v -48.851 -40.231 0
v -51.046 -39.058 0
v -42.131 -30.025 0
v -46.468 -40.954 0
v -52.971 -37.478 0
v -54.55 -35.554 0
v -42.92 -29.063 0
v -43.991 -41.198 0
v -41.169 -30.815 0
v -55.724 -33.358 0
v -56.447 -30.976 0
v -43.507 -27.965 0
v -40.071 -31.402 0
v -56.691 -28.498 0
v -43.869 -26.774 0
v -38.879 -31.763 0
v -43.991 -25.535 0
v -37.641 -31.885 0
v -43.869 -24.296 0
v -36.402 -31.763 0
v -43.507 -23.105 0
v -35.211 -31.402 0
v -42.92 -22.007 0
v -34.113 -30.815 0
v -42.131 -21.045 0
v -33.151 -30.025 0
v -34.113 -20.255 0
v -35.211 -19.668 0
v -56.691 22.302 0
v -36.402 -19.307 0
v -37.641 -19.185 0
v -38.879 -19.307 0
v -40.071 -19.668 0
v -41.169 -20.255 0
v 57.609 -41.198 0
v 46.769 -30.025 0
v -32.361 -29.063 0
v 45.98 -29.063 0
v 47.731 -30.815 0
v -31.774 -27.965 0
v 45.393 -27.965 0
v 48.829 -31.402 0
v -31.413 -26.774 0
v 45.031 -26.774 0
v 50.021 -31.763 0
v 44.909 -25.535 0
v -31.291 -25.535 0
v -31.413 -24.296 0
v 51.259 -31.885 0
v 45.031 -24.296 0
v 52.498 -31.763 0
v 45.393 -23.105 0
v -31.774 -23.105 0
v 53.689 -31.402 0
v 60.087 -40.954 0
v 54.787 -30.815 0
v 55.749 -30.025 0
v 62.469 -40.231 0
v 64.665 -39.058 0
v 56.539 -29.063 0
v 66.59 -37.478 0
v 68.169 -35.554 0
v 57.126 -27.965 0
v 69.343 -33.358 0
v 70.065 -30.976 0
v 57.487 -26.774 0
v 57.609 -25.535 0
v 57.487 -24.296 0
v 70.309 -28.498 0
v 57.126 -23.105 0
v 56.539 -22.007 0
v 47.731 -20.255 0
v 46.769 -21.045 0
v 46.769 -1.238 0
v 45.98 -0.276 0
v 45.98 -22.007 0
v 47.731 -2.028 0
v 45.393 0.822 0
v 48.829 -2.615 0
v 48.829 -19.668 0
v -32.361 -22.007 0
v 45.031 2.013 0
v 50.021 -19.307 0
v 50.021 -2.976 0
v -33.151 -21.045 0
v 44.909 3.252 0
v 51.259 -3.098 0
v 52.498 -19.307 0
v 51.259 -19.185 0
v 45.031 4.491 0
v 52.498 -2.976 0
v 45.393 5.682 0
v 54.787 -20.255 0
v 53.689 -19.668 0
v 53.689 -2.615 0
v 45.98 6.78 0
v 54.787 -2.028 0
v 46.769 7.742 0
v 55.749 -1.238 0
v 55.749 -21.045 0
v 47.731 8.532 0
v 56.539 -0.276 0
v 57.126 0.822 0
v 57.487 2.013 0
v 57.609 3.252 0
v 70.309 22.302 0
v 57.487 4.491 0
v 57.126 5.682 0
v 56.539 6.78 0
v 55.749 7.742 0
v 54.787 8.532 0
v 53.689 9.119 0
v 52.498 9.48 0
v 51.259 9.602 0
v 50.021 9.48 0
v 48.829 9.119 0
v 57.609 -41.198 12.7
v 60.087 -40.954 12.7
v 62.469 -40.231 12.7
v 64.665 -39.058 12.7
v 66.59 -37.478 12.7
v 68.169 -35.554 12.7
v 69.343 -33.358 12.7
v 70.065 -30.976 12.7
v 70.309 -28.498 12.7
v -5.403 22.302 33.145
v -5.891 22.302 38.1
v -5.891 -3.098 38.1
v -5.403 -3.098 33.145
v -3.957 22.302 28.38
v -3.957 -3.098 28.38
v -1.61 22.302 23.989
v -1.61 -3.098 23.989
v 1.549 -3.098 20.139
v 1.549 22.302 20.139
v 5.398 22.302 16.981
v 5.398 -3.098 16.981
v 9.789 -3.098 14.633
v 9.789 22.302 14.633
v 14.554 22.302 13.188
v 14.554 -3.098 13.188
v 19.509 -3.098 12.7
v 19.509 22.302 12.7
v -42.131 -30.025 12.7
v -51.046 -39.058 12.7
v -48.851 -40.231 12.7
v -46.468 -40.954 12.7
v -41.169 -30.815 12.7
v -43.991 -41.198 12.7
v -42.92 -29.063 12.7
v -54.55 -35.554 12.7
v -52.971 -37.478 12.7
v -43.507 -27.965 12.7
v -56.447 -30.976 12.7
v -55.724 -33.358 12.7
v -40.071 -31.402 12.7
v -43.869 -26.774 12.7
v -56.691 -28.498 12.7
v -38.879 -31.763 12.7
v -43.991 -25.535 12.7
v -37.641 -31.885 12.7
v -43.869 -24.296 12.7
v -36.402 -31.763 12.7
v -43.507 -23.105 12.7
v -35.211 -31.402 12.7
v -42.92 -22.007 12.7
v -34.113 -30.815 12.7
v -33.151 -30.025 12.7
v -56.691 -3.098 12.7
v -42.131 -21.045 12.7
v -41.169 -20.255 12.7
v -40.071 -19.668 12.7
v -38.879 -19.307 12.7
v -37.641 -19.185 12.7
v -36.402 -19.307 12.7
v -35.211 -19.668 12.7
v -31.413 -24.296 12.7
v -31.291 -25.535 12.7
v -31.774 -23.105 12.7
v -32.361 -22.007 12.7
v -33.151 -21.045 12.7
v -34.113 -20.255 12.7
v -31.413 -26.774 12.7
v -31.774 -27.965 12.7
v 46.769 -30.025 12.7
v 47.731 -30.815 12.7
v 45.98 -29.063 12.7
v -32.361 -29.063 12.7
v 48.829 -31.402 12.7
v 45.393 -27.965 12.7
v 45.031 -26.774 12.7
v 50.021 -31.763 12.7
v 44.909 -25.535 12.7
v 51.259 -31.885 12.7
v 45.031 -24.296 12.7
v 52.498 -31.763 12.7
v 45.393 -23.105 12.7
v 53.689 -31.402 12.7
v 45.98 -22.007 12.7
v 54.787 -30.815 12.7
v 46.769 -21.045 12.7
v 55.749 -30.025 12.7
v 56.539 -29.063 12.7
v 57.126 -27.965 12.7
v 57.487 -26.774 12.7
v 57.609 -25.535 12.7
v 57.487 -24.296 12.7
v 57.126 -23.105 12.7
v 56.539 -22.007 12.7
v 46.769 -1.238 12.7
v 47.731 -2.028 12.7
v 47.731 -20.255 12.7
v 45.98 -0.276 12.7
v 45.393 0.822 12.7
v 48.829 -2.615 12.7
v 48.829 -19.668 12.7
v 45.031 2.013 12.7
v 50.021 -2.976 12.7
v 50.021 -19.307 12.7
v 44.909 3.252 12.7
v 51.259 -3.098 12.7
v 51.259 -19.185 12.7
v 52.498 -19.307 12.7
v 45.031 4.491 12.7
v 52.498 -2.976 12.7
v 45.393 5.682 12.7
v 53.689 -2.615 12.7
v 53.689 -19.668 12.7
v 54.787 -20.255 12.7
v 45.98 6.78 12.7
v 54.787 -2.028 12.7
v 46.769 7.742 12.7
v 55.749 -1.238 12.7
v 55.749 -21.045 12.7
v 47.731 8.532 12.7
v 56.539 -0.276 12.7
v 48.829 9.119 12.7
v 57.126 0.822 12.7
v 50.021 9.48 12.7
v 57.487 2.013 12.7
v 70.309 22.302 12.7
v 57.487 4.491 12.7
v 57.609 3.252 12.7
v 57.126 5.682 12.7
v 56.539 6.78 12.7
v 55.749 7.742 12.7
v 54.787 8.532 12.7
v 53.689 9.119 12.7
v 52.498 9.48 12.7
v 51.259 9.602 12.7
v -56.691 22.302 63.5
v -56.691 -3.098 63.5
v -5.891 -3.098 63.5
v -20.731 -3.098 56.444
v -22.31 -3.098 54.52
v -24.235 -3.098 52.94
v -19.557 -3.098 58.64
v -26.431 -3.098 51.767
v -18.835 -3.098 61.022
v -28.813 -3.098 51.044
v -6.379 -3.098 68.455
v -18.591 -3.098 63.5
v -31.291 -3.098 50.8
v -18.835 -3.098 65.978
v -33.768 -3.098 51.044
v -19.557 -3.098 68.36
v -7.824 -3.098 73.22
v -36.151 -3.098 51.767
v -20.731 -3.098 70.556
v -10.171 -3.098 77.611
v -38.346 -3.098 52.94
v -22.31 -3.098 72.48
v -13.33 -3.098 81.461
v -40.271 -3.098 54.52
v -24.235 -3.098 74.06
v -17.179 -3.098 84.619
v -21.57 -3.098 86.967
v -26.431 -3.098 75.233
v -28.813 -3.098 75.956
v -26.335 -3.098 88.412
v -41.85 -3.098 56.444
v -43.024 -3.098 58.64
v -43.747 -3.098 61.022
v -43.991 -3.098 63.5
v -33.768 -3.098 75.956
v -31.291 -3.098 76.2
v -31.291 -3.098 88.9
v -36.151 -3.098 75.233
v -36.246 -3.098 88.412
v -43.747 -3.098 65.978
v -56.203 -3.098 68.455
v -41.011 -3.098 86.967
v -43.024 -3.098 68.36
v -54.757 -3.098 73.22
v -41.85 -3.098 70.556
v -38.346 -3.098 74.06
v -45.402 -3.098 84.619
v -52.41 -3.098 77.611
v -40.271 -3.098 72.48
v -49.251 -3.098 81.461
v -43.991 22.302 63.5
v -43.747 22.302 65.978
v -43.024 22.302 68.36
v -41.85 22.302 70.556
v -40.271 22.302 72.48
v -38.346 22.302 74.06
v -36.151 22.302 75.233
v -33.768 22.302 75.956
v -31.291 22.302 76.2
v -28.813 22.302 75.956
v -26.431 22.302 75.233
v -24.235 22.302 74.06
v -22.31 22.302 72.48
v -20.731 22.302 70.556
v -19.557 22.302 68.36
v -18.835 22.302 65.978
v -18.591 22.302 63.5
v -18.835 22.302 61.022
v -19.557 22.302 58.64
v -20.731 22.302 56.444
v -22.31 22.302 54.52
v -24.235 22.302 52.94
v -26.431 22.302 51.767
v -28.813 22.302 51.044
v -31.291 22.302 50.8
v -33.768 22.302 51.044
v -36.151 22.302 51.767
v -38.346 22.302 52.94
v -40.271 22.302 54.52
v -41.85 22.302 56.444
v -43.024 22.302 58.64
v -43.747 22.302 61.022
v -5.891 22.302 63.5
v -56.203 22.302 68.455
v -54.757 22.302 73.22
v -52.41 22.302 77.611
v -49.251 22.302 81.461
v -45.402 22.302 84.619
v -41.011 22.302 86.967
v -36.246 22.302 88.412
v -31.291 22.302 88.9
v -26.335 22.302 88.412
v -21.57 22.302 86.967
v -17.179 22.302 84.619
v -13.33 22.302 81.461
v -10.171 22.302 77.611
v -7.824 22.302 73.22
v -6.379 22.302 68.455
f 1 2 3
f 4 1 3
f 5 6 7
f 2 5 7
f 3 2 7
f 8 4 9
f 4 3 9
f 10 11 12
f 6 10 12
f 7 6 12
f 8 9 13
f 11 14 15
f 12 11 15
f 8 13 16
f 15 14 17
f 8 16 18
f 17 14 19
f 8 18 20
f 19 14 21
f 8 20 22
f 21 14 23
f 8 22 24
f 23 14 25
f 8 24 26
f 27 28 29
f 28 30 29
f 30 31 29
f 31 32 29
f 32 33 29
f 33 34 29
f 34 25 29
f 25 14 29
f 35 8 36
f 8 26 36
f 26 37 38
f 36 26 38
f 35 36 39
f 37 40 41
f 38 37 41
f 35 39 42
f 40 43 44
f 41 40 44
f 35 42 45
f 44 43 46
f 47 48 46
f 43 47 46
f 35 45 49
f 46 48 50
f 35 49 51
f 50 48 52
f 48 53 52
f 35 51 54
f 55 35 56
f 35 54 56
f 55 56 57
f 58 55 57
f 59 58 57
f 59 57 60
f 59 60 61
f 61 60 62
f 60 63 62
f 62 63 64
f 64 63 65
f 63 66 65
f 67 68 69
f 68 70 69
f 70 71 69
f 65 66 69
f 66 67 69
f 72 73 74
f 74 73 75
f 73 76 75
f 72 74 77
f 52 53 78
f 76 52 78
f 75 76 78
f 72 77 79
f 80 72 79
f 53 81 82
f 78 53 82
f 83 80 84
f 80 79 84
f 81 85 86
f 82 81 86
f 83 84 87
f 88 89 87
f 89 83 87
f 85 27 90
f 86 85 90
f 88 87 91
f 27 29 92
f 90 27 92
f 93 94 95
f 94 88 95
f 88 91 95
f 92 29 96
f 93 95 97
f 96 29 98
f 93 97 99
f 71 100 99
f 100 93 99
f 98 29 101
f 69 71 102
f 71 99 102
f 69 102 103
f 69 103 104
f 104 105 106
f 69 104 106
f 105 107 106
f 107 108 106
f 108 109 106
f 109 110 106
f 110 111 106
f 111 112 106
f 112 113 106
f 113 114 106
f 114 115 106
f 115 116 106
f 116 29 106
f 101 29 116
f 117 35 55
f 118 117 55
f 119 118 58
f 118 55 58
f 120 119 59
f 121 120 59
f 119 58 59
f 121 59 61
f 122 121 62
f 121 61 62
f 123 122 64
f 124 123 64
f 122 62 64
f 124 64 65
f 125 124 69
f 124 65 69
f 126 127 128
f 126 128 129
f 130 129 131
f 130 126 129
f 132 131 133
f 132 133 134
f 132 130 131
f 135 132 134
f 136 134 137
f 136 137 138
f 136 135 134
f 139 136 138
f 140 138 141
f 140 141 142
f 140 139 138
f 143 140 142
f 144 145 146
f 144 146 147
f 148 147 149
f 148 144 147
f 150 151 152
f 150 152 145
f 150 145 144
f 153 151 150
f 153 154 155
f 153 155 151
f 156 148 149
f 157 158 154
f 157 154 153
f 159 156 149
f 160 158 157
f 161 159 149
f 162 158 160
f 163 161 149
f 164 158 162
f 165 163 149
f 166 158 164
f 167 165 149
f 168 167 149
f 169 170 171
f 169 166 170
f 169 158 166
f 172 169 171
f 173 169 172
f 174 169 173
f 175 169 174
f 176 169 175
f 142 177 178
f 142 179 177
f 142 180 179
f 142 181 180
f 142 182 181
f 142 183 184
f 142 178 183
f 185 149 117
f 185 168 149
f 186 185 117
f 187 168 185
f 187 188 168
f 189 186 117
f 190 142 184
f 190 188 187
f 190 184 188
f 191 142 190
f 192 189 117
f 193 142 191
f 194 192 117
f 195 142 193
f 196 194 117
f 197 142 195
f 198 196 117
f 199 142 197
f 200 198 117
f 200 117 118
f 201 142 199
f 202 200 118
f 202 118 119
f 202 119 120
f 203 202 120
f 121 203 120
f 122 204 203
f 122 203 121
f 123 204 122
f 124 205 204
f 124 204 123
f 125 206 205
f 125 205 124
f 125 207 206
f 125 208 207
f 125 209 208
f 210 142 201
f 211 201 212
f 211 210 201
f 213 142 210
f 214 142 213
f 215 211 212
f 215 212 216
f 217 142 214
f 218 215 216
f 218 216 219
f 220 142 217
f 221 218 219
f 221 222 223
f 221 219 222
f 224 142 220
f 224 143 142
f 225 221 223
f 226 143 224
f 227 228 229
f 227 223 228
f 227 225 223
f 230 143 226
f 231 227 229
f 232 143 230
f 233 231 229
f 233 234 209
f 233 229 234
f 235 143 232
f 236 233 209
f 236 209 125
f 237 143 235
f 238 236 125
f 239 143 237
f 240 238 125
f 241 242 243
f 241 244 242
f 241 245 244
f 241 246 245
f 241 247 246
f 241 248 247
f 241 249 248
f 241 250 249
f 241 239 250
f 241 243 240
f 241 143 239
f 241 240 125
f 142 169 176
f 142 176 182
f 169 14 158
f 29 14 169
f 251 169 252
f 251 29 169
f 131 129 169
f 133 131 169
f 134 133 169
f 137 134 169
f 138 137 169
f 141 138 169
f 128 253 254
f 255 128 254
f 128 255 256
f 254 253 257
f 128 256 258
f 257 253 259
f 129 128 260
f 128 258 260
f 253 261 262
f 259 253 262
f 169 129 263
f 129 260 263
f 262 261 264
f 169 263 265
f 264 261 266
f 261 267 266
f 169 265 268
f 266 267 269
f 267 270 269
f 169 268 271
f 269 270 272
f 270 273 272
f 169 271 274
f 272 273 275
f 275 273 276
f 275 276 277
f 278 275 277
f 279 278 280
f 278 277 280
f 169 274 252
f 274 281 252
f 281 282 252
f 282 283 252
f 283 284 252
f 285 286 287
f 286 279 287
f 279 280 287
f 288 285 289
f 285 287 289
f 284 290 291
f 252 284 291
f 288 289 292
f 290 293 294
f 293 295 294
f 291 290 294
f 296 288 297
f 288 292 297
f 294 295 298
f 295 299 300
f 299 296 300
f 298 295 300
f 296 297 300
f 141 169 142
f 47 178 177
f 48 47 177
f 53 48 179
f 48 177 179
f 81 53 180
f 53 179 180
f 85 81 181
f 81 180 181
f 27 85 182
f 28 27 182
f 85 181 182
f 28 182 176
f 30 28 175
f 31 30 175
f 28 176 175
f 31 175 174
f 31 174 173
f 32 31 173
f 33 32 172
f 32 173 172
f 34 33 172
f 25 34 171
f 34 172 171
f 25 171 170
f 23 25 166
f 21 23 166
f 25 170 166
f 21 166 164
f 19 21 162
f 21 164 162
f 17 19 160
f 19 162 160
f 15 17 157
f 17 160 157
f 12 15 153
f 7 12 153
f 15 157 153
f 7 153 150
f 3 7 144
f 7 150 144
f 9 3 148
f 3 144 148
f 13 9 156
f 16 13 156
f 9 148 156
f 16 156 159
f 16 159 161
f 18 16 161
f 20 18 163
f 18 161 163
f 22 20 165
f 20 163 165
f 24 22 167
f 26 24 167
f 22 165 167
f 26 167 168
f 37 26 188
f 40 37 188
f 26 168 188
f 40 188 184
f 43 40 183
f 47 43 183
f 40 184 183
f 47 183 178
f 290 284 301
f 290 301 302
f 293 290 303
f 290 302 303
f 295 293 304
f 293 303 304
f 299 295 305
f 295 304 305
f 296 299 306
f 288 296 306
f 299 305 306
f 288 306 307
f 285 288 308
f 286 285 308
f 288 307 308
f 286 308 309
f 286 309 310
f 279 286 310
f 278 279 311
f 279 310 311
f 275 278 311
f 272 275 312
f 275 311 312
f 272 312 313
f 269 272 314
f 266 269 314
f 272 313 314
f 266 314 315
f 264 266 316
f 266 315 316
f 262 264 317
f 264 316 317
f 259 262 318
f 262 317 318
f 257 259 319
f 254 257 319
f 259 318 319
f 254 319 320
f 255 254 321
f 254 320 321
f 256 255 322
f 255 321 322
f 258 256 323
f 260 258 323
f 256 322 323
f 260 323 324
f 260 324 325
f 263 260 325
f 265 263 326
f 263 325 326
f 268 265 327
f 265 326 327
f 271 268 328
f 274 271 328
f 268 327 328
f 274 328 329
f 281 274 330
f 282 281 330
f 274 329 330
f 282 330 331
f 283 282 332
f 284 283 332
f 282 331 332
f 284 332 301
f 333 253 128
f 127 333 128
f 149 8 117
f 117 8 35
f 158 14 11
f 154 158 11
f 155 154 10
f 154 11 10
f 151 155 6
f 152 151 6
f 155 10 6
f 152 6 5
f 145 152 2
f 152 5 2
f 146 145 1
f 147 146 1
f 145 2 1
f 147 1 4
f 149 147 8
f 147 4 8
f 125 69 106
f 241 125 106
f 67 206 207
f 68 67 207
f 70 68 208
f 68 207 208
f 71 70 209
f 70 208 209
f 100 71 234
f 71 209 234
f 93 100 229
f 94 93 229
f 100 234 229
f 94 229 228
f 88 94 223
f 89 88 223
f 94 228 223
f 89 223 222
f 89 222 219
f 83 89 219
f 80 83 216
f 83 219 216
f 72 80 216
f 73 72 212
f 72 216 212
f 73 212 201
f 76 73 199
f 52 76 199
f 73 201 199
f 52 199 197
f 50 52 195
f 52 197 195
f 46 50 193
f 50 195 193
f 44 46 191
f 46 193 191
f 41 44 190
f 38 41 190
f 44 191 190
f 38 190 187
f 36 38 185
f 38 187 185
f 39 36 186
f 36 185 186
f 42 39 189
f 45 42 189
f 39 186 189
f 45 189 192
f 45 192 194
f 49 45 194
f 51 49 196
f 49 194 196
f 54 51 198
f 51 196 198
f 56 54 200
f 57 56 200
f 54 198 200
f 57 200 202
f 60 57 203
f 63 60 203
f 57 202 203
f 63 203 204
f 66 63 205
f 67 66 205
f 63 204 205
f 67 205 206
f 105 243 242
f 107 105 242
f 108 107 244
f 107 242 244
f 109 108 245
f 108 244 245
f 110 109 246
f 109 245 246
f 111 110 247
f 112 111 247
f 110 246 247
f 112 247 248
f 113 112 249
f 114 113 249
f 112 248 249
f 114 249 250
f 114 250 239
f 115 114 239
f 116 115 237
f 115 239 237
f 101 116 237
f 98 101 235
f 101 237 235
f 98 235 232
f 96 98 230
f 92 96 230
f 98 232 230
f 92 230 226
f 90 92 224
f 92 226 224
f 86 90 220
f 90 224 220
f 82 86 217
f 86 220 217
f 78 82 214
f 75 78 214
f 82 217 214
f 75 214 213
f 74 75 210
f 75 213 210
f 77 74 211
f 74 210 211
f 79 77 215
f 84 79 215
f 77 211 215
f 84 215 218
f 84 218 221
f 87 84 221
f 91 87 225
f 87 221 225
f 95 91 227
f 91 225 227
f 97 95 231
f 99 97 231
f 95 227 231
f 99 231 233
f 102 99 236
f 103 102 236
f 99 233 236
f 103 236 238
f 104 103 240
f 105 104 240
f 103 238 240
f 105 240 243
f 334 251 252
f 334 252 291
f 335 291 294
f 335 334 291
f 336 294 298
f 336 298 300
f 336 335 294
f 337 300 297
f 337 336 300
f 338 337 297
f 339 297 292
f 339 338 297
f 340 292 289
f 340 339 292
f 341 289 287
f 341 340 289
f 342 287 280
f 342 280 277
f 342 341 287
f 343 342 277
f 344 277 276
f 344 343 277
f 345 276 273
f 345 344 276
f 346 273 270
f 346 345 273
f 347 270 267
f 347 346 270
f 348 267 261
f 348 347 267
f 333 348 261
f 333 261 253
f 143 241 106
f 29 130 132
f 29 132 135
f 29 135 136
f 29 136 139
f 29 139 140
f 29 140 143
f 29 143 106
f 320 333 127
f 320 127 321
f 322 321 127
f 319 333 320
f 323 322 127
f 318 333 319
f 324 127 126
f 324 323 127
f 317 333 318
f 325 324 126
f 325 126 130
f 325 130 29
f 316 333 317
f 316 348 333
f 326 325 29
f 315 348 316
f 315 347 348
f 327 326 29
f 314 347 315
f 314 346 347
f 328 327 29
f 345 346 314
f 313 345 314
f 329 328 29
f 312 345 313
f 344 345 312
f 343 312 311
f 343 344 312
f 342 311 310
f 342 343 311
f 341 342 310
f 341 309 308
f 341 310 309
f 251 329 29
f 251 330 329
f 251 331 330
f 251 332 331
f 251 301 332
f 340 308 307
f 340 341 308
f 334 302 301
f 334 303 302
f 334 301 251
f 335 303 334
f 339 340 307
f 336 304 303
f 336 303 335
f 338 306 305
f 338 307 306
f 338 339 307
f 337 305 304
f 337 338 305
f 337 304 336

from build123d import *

# Parameters (mm, degrees)
F1_DEPTH = 12.7
F2_R     = 6.35
F3_DEPTH = 12.7
F4_R     = 12.7
F5_DEPTH = 25.4


with BuildPart() as f1:
    # F0 (on Top) → F1 (new body)
    with BuildSketch(Plane.XY):
        with BuildLine():
            ThreePointArc((-56.690635, -28.497916), (-52.970891, -37.478172), (-43.990635, -41.197916))
            Line((-43.990635, -41.197916), (57.609365, -41.197916))
            ThreePointArc((57.609365, -41.197916), (66.589621, -37.478172), (70.309365, -28.497916))
            Line((70.309365, -28.497916), (70.309365, 22.302084))
            Line((70.309365, 22.302084), (-56.690635, 22.302084))
            Line((-56.690635, 22.302084), (-56.690635, -28.497916))
        make_face()
    extrude(amount=F1_DEPTH)

    # F2 (on face) → F3 (cut)
    with BuildSketch(Plane.XY.offset(12.7)):
        with Locations((-37.640635, -25.535107)):
            Circle(F2_R)
        with Locations((51.259365, -25.535107)):
            Circle(F2_R)
        with Locations((51.259365, 3.252084)):
            Circle(F2_R)
    extrude(amount=-F3_DEPTH, mode=Mode.SUBTRACT)

    # F4 (on face) → F5 (join)
    with BuildSketch(Plane(origin=(0, 22.302084, 0), x_dir=(-1, 0, 0), z_dir=(0, 1, 0))):
        with BuildLine():
            Line((5.890635, 63.5), (5.890635, 38.1))
            ThreePointArc((5.890635, 38.1), (-1.548853, 20.139488), (-19.509365, 12.7))
            Line((-19.509365, 12.7), (56.690635, 12.7))
            Line((56.690635, 12.7), (56.690635, 63.5))
            ThreePointArc((56.690635, 63.5), (31.290635, 88.9), (5.890635, 63.5))
        make_face()
        with Locations((31.290635, 63.5)):
            Circle(F4_R, mode=Mode.SUBTRACT)
    extrude(amount=-F5_DEPTH)


solid = f1.part
